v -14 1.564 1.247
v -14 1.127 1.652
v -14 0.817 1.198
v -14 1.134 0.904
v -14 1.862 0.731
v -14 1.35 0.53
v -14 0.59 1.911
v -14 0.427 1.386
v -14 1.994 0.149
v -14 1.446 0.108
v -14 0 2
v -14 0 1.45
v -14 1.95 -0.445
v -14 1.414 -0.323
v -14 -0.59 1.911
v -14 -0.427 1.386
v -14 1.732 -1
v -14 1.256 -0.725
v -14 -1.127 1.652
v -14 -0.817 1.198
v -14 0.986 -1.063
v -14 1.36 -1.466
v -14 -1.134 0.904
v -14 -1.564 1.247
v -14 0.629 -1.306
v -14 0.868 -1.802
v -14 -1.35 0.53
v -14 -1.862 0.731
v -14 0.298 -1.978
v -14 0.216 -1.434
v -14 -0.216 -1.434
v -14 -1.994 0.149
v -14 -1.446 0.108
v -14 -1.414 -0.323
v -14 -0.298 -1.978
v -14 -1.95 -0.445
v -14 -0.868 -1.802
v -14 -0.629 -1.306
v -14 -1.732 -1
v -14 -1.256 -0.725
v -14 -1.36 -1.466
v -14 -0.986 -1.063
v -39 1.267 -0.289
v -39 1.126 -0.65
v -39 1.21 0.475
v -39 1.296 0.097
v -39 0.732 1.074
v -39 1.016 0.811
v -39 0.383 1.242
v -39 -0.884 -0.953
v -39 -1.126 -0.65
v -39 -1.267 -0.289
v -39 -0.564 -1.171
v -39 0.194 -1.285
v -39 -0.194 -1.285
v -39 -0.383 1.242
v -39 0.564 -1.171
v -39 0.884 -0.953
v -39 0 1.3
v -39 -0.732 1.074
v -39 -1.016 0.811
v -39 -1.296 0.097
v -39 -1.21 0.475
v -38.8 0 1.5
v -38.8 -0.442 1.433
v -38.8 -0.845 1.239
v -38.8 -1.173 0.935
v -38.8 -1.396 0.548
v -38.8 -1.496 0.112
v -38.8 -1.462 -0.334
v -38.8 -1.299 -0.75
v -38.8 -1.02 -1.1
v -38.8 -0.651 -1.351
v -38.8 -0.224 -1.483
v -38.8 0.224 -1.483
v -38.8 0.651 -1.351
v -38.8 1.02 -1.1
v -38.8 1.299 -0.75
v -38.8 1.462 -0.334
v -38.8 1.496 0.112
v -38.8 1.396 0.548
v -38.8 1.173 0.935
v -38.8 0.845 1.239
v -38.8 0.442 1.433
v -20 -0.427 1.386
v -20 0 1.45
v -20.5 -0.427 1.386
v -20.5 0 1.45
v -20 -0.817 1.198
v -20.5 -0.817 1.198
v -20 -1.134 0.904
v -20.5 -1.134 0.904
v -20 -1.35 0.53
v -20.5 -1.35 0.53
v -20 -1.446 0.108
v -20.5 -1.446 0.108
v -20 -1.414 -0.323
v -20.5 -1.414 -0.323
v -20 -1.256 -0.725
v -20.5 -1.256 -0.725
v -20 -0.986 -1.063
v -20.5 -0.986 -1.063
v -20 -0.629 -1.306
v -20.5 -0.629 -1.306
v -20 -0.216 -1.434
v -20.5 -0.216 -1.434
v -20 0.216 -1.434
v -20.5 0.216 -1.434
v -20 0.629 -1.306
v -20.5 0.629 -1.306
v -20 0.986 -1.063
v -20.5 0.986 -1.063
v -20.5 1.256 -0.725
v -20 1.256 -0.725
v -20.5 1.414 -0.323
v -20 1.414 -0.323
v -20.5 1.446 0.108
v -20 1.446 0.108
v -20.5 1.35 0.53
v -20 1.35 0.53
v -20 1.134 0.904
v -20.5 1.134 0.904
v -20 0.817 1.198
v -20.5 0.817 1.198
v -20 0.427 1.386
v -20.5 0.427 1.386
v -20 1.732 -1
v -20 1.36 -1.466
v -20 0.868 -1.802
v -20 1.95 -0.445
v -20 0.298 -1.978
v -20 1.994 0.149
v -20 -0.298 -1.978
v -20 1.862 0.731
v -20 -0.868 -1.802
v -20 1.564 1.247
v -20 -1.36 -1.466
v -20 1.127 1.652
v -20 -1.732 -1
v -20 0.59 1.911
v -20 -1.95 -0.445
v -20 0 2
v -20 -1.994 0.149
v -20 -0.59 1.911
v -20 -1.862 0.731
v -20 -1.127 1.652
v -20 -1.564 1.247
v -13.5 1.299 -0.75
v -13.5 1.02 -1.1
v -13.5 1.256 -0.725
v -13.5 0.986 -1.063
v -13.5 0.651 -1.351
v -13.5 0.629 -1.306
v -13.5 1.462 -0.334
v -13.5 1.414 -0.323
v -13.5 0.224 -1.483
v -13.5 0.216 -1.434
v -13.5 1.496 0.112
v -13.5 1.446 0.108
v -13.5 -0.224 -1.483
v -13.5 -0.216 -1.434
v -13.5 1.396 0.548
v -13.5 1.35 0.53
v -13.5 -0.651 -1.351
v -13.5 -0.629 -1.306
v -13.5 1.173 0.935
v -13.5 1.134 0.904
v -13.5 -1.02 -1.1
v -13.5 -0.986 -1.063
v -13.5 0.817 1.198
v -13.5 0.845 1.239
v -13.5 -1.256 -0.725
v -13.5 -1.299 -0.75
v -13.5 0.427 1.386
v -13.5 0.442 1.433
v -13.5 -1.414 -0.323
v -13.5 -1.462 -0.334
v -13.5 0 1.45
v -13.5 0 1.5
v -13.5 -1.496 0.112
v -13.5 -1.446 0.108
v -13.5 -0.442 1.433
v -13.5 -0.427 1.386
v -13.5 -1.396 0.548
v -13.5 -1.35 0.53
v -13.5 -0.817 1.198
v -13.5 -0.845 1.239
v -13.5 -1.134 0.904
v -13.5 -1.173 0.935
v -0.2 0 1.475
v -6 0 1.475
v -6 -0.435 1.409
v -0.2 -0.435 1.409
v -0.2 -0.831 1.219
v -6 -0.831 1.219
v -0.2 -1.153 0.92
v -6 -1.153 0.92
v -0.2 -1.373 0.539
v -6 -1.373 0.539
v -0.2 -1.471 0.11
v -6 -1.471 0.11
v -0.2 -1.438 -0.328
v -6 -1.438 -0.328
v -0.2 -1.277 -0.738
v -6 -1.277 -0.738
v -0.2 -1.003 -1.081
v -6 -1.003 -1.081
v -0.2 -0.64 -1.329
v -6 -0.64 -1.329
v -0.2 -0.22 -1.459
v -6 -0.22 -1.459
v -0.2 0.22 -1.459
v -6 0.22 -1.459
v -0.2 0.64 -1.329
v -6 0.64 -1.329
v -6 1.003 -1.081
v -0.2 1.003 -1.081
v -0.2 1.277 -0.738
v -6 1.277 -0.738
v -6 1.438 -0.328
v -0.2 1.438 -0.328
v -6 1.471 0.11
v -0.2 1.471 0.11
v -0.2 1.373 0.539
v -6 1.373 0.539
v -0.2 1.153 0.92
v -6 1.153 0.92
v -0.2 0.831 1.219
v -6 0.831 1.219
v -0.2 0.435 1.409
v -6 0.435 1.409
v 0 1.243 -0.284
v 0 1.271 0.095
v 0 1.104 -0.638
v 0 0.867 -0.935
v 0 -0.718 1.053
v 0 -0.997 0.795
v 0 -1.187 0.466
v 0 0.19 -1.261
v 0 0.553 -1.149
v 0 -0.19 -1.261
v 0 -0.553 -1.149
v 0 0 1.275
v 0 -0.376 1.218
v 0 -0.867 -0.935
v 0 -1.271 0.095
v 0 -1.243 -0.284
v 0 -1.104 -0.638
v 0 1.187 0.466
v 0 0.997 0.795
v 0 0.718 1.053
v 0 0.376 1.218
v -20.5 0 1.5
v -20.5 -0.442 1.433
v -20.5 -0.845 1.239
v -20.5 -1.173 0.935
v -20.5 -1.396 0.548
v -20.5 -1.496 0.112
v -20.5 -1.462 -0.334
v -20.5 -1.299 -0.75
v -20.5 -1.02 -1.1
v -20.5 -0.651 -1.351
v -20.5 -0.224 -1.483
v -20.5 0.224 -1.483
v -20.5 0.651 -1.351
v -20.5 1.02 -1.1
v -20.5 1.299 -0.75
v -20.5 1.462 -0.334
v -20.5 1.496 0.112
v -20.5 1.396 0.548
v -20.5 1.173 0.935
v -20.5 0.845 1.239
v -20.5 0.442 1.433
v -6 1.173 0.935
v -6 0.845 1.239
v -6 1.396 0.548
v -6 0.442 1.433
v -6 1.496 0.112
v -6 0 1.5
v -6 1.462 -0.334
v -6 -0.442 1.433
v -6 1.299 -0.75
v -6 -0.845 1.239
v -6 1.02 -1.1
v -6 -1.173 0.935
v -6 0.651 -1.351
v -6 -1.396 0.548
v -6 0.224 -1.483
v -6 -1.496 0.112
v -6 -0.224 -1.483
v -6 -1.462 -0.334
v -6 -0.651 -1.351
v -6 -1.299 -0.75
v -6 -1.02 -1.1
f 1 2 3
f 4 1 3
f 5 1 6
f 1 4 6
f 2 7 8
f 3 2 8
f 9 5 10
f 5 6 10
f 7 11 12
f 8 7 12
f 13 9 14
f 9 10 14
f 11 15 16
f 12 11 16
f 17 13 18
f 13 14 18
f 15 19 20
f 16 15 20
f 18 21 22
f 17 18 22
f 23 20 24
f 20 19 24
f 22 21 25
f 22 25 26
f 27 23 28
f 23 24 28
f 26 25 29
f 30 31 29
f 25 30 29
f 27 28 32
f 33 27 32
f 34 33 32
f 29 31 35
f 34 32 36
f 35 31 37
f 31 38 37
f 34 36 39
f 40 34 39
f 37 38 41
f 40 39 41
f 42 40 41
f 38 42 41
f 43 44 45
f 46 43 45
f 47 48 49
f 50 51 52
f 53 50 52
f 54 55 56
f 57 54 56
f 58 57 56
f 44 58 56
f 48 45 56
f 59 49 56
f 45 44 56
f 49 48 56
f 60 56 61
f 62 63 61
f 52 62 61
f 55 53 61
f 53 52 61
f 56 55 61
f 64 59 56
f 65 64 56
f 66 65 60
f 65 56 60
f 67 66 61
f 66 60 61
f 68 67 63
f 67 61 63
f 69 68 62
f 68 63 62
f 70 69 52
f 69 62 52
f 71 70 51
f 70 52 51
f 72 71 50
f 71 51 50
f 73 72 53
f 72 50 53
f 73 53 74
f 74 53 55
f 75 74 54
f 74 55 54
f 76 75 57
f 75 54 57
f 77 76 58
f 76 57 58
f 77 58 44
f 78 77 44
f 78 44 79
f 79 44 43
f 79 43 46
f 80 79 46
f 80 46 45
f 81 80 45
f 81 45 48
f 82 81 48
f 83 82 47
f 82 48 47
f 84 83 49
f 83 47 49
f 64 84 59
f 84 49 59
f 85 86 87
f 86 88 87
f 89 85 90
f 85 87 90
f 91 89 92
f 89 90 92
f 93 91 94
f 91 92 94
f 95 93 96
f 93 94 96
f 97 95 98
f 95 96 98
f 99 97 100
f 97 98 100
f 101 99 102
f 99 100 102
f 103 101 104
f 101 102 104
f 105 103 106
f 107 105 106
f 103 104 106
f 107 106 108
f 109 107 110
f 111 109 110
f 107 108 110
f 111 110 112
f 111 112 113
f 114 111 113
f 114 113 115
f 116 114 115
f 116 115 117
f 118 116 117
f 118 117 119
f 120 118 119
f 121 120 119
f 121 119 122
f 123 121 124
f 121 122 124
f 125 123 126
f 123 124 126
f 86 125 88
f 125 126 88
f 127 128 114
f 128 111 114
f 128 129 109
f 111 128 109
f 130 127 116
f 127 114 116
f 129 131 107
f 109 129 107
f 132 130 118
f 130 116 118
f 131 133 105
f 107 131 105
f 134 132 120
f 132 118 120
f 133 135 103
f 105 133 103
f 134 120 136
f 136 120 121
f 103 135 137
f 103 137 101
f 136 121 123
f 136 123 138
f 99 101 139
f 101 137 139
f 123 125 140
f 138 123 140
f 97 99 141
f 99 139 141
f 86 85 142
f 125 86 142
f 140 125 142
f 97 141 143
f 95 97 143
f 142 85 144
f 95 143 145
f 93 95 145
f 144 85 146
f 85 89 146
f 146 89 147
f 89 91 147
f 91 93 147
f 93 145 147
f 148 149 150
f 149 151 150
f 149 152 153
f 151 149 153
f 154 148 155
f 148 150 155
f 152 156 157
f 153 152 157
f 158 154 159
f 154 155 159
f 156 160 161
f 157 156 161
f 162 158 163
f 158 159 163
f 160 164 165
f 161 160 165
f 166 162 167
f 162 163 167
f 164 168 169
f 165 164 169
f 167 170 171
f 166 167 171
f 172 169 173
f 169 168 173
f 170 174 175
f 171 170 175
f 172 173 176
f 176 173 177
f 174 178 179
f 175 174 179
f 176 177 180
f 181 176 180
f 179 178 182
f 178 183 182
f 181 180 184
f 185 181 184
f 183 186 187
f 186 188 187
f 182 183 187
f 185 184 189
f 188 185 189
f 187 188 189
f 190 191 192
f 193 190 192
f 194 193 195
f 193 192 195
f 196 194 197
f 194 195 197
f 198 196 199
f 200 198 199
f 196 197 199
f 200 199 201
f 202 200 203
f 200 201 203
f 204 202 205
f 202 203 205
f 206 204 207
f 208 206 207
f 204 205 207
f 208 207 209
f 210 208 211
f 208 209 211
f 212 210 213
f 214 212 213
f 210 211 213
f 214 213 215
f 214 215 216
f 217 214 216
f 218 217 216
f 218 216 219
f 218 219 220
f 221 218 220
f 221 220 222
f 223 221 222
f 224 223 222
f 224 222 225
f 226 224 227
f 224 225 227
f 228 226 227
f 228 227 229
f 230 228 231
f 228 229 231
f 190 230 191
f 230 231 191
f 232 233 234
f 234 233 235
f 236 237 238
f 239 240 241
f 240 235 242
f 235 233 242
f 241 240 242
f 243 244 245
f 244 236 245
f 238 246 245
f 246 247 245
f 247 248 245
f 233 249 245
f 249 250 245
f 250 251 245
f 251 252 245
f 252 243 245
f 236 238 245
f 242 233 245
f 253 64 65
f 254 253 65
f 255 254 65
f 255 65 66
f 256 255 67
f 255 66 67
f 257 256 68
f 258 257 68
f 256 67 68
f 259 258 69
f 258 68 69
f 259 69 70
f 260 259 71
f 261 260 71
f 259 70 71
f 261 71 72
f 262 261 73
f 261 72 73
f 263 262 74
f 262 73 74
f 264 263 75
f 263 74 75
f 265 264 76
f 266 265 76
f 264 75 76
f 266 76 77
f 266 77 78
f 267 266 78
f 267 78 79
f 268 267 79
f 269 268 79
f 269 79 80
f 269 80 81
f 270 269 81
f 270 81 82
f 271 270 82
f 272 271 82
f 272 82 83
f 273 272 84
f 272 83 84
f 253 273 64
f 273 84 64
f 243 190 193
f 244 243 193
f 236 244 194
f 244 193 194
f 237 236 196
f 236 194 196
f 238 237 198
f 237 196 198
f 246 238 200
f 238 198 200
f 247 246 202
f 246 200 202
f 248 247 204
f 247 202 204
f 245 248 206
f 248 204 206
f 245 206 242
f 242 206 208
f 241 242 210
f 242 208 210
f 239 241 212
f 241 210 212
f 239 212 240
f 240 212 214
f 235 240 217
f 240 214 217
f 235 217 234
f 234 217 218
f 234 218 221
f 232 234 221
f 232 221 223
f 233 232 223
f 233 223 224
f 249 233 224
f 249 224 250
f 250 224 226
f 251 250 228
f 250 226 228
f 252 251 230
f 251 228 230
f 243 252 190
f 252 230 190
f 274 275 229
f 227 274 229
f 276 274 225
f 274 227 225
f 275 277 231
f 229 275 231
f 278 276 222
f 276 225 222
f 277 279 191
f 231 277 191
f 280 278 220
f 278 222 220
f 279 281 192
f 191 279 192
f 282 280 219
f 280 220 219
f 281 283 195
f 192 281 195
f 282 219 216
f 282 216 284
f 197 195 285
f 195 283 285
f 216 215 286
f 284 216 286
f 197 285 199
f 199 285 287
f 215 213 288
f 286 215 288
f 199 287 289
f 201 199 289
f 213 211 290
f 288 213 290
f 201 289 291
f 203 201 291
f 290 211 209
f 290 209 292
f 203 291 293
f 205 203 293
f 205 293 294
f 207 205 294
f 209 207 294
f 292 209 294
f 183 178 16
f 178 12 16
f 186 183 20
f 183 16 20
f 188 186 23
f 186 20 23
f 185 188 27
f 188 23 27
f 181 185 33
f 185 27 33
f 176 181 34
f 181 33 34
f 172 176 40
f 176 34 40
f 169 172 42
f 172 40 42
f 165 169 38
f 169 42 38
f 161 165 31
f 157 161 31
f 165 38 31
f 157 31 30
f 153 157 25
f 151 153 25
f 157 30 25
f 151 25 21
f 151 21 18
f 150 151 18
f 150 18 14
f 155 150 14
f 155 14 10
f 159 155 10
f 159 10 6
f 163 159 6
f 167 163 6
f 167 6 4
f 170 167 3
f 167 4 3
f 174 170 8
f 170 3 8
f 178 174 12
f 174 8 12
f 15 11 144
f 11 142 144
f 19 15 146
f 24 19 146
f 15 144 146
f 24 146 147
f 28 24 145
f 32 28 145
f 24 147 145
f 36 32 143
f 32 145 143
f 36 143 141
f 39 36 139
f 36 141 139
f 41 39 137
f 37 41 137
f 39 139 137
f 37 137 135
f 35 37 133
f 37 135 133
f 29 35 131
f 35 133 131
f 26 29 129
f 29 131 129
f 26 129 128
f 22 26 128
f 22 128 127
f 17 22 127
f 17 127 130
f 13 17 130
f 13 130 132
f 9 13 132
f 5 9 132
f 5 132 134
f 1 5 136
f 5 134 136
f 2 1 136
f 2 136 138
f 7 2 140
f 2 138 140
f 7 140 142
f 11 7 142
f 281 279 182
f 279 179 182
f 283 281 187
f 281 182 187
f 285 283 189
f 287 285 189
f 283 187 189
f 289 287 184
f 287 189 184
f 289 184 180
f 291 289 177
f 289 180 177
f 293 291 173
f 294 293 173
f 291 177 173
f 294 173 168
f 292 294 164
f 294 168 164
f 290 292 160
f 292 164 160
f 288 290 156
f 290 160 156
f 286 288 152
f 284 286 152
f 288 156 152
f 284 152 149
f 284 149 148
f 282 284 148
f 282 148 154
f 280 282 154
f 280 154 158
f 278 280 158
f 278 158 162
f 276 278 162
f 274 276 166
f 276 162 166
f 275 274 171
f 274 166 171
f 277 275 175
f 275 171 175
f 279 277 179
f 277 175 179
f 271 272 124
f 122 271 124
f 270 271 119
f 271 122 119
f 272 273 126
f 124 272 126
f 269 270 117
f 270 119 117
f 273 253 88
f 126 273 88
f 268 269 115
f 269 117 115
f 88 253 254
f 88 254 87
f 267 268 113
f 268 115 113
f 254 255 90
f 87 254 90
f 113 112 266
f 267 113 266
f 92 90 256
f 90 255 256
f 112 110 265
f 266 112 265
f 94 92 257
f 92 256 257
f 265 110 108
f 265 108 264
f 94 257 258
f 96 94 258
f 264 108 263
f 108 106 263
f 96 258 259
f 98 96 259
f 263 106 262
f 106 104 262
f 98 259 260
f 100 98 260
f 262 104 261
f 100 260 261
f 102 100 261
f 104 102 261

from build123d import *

# Parameters (mm, degrees)
CHAMFER_1_SIZE = 0.2


with BuildPart() as part:
    # 草图1 → 旋转1 (revolve)
    with BuildSketch(Plane.XY, mode=Mode.PRIVATE) as revolve_1_sk:
        Polygon((0, 0), (0, 1.475), (-6, 1.475), (-6, 1.5), (-13.5, 1.5), (-13.5, 1.45), (-14, 1.45), (-14, 2), (-20, 2), (-20, 1.45), (-20.5, 1.45), (-20.5, 1.5), (-39, 1.5), (-39, 0), align=None)
    revolve(revolve_1_sk.sketch.rotate(Axis((-12.088767593, 0, 0), (1, 0, 0)), 90), axis=Axis((-12.088767593, 0, 0), (1, 0, 0)))

    # 倒角1
    chamfer_1_edges = [part.edges().sort_by_distance(p)[0] for p in [
        (0, 0, -1.475),
        (-39, 0, -1.5),
    ]]
    chamfer(chamfer_1_edges, length=CHAMFER_1_SIZE)


solid = part.part
